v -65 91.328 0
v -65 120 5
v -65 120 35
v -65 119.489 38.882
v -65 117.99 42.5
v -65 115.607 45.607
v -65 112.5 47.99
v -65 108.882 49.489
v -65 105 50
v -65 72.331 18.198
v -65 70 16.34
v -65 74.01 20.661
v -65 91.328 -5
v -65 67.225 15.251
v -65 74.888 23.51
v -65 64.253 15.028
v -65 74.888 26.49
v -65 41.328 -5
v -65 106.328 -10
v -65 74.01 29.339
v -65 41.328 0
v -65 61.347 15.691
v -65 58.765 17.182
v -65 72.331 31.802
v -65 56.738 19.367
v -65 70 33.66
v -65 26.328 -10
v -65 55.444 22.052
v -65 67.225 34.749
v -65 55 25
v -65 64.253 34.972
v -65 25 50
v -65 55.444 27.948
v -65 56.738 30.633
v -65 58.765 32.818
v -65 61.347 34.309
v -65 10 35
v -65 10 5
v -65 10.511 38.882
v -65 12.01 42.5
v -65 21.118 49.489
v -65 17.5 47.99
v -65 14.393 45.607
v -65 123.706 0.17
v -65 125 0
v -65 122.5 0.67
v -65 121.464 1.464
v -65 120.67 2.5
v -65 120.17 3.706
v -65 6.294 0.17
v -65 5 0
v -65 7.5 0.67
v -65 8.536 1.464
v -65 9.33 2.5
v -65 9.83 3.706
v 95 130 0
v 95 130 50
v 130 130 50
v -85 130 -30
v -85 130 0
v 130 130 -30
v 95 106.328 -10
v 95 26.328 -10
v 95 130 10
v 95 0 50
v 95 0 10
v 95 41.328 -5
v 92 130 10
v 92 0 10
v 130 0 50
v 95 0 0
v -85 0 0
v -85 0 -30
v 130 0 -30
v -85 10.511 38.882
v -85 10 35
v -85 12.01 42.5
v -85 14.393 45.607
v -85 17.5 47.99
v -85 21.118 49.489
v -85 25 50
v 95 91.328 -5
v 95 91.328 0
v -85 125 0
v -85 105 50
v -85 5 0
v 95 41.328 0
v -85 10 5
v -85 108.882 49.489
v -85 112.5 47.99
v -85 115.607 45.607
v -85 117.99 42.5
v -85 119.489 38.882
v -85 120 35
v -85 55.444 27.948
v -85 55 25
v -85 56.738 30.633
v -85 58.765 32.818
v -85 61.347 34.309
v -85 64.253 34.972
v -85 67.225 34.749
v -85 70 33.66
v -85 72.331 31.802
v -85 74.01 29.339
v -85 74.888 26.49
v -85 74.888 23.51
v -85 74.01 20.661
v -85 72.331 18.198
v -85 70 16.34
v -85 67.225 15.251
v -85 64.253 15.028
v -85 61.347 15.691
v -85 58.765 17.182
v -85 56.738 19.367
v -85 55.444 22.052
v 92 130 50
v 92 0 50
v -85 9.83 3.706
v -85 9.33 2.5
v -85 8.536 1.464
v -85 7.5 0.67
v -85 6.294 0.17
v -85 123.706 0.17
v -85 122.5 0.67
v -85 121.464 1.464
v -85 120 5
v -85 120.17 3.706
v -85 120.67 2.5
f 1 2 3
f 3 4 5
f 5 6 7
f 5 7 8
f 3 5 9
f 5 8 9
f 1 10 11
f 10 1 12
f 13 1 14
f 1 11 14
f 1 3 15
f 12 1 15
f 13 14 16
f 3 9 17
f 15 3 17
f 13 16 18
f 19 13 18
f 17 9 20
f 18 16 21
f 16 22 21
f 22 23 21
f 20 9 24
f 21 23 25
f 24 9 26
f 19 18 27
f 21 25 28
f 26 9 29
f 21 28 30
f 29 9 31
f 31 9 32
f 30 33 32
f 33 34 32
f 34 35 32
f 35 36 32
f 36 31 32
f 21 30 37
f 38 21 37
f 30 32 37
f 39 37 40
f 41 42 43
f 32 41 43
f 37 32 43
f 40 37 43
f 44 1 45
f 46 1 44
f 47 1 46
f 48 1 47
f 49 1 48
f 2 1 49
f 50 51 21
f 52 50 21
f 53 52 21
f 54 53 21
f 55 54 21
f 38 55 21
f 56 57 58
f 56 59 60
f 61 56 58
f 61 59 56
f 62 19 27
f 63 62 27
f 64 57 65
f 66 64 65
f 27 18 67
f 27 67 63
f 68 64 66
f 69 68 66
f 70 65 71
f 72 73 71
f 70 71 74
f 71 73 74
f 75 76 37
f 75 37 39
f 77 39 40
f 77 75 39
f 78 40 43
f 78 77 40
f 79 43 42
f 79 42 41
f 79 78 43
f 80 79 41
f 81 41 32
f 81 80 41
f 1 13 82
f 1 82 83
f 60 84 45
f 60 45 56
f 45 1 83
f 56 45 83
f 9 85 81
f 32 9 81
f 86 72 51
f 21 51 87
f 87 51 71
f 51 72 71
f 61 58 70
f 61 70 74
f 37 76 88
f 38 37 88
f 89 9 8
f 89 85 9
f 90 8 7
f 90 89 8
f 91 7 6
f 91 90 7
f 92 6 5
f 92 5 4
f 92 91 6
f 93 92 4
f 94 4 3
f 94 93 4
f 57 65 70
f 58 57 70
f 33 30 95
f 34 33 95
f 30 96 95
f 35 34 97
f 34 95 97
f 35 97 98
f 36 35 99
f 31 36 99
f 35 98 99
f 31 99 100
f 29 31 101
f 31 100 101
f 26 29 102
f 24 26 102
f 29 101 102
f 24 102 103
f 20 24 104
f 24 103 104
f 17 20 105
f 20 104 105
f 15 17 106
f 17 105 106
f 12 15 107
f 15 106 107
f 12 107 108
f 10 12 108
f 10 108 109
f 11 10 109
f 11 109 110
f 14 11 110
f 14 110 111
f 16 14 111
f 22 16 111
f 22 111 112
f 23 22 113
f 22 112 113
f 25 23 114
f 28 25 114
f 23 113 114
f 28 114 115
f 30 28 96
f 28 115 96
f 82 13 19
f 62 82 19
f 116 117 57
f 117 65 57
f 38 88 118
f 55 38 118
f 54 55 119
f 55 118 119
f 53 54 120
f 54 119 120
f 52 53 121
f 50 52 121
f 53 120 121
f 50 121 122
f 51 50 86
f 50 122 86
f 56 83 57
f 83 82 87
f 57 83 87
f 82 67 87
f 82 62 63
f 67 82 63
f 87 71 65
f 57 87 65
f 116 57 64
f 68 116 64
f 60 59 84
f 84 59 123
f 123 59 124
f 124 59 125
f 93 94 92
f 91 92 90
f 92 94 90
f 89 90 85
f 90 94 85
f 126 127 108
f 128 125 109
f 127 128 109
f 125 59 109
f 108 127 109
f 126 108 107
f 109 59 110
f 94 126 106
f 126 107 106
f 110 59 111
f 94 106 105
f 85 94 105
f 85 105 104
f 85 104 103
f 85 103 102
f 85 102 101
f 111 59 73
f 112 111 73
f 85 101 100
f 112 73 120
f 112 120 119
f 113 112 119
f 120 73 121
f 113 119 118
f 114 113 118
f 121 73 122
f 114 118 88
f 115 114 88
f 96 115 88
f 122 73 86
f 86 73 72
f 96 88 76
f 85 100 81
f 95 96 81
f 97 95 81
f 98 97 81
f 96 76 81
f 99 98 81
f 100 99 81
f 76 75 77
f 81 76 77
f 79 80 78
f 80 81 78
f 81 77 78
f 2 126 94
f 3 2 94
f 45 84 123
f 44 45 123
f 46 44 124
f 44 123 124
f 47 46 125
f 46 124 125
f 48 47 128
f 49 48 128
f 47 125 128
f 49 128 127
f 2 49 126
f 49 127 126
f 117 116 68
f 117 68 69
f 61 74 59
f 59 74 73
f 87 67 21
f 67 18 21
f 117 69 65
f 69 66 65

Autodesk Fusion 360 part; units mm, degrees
sketch "Sketch1" plane through (0, 0, 0) normal (0, 1, 0) x (1, 0, 0)
  line L0 (-85, 0) -> (95, 0)
  line L1 (95, 0) -> (95, -50)
  line L2 (95, -50) -> (130, -50)
  line L3 (130, -50) -> (130, 30)
  line L4 (130, 30) -> (-85, 30)
  line L5 (-85, 30) -> (-85, 0)
  dimension "d1" = 80
  dimension "d2" = 215
  dimension "d3" = 30
  dimension "d4" = 50
  dimension "d5" = 35
extrude "Extrude1" add sketch "Sketch1" along normal blind 130 makes body 1
sketch "Sketch2" plane through (-85, 0, 0) normal (-1, 0, 0) x (0, -1, 0)
  line L0 (0, -30) -> (0, 0)
  line L1 (0, 0) -> (-130, 0)
  line L2 (-130, 0) -> (-130, -30)
  line L3 (-130, -30) -> (0, -30)
  line L4 (-120, 5) -> (-120, 35)
  line L5 (-105, 50) -> (-25, 50)
  line L6 (-10, 35) -> (-10, 5)
  line L7 (-130, 0) -> (-130, 50)
  line L8 (0, 0) -> (0, 50)
  arc A0 (-105, 50) -> (-120, 35) centre (-105, 35) ccw
  line L9 (-130, 0) -> (-125, 0)
  arc A1 (-125, 0) -> (-120, 5) centre (-125, 5) ccw
  arc A2 (-10, 35) -> (-25, 50) centre (-25, 35) ccw
  line L10 (0, 0) -> (-5, 0)
  arc A3 (-10, 5) -> (-5, 0) centre (-5, 5) ccw
  circle A4 centre (-65, 25) radius 10
  dimension "d8" = 10
  dimension "d9" = 10
  dimension "d10" = 15
  dimension "d11" = 5
  dimension "d12" = 15
  dimension "d13" = 5
  dimension "d14" = 20
  dimension "d15" = 25
  dimension "d16" = 65
extrude "Extrude2" add sketch "Sketch2" against normal blind 20 contours L1 L4 L5 L6 A0 A1 A2 A3 bodies 1
sketch "Sketch3" plane through (0, 0, 0) normal (1, 0, 0) x (0, 1, 0)
  line L0 (130, 0) -> (0, 0)
  line L1 (66.3285, 25) -> (66.3285, -32.6161) construction
  line L2 (41.3285, -5) -> (26.3285, -10)
  line L3 (26.3285, -10) -> (66.3285, -10)
  line L4 (41.3285, -5) -> (41.3285, 0)
  line L5 (91.3285, -5) -> (91.3285, 0)
  line L6 (91.3285, -5) -> (106.3285, -10)
  line L7 (106.3285, -10) -> (66.3285, -10)
  line L8 (41.3285, 0) -> (91.3285, 0)
  dimension "d19" = 5
  dimension "d20" = 40
  dimension "d21" = 25
  dimension "d26" = 130
  dimension "d27" = 10
extrude "Extrude3" cut sketch "Sketch3" along normal blind 95 and the other way blind 65 bodies 1
sketch "Sketch4" plane through (95, 0, 0) normal (-1, 0, 0) x (0, -1, 0)
  line L0 (0, 0) -> (0, 50)
  line L1 (0, 50) -> (-130, 50)
  line L2 (-130, 50) -> (-130, 0)
  line L3 (-130, 0) -> (-91.3285, 0)
  line L4 (-91.3285, 0) -> (-91.3285, -5)
  line L5 (-91.3285, -5) -> (-106.3285, -10)
  line L6 (-106.3285, -10) -> (-26.3285, -10)
  line L7 (-26.3285, -10) -> (-41.3285, -5)
  line L8 (-41.3285, -5) -> (-41.3285, 0)
  line L9 (-41.3285, 0) -> (0, 0)
  line L10 (-130, 50) -> (0, 50)
  line L11 (0, 10) -> (0, 50)
  line L12 (-130, 50) -> (-130, 10)
  line L13 (-130, 10) -> (0, 10)
  dimension "d28" = 40
extrude "Extrude4" add sketch "Sketch4" along normal blind 3 separate body contours L0 L1 L2 L10 L11 L12 L13 makes body 2
